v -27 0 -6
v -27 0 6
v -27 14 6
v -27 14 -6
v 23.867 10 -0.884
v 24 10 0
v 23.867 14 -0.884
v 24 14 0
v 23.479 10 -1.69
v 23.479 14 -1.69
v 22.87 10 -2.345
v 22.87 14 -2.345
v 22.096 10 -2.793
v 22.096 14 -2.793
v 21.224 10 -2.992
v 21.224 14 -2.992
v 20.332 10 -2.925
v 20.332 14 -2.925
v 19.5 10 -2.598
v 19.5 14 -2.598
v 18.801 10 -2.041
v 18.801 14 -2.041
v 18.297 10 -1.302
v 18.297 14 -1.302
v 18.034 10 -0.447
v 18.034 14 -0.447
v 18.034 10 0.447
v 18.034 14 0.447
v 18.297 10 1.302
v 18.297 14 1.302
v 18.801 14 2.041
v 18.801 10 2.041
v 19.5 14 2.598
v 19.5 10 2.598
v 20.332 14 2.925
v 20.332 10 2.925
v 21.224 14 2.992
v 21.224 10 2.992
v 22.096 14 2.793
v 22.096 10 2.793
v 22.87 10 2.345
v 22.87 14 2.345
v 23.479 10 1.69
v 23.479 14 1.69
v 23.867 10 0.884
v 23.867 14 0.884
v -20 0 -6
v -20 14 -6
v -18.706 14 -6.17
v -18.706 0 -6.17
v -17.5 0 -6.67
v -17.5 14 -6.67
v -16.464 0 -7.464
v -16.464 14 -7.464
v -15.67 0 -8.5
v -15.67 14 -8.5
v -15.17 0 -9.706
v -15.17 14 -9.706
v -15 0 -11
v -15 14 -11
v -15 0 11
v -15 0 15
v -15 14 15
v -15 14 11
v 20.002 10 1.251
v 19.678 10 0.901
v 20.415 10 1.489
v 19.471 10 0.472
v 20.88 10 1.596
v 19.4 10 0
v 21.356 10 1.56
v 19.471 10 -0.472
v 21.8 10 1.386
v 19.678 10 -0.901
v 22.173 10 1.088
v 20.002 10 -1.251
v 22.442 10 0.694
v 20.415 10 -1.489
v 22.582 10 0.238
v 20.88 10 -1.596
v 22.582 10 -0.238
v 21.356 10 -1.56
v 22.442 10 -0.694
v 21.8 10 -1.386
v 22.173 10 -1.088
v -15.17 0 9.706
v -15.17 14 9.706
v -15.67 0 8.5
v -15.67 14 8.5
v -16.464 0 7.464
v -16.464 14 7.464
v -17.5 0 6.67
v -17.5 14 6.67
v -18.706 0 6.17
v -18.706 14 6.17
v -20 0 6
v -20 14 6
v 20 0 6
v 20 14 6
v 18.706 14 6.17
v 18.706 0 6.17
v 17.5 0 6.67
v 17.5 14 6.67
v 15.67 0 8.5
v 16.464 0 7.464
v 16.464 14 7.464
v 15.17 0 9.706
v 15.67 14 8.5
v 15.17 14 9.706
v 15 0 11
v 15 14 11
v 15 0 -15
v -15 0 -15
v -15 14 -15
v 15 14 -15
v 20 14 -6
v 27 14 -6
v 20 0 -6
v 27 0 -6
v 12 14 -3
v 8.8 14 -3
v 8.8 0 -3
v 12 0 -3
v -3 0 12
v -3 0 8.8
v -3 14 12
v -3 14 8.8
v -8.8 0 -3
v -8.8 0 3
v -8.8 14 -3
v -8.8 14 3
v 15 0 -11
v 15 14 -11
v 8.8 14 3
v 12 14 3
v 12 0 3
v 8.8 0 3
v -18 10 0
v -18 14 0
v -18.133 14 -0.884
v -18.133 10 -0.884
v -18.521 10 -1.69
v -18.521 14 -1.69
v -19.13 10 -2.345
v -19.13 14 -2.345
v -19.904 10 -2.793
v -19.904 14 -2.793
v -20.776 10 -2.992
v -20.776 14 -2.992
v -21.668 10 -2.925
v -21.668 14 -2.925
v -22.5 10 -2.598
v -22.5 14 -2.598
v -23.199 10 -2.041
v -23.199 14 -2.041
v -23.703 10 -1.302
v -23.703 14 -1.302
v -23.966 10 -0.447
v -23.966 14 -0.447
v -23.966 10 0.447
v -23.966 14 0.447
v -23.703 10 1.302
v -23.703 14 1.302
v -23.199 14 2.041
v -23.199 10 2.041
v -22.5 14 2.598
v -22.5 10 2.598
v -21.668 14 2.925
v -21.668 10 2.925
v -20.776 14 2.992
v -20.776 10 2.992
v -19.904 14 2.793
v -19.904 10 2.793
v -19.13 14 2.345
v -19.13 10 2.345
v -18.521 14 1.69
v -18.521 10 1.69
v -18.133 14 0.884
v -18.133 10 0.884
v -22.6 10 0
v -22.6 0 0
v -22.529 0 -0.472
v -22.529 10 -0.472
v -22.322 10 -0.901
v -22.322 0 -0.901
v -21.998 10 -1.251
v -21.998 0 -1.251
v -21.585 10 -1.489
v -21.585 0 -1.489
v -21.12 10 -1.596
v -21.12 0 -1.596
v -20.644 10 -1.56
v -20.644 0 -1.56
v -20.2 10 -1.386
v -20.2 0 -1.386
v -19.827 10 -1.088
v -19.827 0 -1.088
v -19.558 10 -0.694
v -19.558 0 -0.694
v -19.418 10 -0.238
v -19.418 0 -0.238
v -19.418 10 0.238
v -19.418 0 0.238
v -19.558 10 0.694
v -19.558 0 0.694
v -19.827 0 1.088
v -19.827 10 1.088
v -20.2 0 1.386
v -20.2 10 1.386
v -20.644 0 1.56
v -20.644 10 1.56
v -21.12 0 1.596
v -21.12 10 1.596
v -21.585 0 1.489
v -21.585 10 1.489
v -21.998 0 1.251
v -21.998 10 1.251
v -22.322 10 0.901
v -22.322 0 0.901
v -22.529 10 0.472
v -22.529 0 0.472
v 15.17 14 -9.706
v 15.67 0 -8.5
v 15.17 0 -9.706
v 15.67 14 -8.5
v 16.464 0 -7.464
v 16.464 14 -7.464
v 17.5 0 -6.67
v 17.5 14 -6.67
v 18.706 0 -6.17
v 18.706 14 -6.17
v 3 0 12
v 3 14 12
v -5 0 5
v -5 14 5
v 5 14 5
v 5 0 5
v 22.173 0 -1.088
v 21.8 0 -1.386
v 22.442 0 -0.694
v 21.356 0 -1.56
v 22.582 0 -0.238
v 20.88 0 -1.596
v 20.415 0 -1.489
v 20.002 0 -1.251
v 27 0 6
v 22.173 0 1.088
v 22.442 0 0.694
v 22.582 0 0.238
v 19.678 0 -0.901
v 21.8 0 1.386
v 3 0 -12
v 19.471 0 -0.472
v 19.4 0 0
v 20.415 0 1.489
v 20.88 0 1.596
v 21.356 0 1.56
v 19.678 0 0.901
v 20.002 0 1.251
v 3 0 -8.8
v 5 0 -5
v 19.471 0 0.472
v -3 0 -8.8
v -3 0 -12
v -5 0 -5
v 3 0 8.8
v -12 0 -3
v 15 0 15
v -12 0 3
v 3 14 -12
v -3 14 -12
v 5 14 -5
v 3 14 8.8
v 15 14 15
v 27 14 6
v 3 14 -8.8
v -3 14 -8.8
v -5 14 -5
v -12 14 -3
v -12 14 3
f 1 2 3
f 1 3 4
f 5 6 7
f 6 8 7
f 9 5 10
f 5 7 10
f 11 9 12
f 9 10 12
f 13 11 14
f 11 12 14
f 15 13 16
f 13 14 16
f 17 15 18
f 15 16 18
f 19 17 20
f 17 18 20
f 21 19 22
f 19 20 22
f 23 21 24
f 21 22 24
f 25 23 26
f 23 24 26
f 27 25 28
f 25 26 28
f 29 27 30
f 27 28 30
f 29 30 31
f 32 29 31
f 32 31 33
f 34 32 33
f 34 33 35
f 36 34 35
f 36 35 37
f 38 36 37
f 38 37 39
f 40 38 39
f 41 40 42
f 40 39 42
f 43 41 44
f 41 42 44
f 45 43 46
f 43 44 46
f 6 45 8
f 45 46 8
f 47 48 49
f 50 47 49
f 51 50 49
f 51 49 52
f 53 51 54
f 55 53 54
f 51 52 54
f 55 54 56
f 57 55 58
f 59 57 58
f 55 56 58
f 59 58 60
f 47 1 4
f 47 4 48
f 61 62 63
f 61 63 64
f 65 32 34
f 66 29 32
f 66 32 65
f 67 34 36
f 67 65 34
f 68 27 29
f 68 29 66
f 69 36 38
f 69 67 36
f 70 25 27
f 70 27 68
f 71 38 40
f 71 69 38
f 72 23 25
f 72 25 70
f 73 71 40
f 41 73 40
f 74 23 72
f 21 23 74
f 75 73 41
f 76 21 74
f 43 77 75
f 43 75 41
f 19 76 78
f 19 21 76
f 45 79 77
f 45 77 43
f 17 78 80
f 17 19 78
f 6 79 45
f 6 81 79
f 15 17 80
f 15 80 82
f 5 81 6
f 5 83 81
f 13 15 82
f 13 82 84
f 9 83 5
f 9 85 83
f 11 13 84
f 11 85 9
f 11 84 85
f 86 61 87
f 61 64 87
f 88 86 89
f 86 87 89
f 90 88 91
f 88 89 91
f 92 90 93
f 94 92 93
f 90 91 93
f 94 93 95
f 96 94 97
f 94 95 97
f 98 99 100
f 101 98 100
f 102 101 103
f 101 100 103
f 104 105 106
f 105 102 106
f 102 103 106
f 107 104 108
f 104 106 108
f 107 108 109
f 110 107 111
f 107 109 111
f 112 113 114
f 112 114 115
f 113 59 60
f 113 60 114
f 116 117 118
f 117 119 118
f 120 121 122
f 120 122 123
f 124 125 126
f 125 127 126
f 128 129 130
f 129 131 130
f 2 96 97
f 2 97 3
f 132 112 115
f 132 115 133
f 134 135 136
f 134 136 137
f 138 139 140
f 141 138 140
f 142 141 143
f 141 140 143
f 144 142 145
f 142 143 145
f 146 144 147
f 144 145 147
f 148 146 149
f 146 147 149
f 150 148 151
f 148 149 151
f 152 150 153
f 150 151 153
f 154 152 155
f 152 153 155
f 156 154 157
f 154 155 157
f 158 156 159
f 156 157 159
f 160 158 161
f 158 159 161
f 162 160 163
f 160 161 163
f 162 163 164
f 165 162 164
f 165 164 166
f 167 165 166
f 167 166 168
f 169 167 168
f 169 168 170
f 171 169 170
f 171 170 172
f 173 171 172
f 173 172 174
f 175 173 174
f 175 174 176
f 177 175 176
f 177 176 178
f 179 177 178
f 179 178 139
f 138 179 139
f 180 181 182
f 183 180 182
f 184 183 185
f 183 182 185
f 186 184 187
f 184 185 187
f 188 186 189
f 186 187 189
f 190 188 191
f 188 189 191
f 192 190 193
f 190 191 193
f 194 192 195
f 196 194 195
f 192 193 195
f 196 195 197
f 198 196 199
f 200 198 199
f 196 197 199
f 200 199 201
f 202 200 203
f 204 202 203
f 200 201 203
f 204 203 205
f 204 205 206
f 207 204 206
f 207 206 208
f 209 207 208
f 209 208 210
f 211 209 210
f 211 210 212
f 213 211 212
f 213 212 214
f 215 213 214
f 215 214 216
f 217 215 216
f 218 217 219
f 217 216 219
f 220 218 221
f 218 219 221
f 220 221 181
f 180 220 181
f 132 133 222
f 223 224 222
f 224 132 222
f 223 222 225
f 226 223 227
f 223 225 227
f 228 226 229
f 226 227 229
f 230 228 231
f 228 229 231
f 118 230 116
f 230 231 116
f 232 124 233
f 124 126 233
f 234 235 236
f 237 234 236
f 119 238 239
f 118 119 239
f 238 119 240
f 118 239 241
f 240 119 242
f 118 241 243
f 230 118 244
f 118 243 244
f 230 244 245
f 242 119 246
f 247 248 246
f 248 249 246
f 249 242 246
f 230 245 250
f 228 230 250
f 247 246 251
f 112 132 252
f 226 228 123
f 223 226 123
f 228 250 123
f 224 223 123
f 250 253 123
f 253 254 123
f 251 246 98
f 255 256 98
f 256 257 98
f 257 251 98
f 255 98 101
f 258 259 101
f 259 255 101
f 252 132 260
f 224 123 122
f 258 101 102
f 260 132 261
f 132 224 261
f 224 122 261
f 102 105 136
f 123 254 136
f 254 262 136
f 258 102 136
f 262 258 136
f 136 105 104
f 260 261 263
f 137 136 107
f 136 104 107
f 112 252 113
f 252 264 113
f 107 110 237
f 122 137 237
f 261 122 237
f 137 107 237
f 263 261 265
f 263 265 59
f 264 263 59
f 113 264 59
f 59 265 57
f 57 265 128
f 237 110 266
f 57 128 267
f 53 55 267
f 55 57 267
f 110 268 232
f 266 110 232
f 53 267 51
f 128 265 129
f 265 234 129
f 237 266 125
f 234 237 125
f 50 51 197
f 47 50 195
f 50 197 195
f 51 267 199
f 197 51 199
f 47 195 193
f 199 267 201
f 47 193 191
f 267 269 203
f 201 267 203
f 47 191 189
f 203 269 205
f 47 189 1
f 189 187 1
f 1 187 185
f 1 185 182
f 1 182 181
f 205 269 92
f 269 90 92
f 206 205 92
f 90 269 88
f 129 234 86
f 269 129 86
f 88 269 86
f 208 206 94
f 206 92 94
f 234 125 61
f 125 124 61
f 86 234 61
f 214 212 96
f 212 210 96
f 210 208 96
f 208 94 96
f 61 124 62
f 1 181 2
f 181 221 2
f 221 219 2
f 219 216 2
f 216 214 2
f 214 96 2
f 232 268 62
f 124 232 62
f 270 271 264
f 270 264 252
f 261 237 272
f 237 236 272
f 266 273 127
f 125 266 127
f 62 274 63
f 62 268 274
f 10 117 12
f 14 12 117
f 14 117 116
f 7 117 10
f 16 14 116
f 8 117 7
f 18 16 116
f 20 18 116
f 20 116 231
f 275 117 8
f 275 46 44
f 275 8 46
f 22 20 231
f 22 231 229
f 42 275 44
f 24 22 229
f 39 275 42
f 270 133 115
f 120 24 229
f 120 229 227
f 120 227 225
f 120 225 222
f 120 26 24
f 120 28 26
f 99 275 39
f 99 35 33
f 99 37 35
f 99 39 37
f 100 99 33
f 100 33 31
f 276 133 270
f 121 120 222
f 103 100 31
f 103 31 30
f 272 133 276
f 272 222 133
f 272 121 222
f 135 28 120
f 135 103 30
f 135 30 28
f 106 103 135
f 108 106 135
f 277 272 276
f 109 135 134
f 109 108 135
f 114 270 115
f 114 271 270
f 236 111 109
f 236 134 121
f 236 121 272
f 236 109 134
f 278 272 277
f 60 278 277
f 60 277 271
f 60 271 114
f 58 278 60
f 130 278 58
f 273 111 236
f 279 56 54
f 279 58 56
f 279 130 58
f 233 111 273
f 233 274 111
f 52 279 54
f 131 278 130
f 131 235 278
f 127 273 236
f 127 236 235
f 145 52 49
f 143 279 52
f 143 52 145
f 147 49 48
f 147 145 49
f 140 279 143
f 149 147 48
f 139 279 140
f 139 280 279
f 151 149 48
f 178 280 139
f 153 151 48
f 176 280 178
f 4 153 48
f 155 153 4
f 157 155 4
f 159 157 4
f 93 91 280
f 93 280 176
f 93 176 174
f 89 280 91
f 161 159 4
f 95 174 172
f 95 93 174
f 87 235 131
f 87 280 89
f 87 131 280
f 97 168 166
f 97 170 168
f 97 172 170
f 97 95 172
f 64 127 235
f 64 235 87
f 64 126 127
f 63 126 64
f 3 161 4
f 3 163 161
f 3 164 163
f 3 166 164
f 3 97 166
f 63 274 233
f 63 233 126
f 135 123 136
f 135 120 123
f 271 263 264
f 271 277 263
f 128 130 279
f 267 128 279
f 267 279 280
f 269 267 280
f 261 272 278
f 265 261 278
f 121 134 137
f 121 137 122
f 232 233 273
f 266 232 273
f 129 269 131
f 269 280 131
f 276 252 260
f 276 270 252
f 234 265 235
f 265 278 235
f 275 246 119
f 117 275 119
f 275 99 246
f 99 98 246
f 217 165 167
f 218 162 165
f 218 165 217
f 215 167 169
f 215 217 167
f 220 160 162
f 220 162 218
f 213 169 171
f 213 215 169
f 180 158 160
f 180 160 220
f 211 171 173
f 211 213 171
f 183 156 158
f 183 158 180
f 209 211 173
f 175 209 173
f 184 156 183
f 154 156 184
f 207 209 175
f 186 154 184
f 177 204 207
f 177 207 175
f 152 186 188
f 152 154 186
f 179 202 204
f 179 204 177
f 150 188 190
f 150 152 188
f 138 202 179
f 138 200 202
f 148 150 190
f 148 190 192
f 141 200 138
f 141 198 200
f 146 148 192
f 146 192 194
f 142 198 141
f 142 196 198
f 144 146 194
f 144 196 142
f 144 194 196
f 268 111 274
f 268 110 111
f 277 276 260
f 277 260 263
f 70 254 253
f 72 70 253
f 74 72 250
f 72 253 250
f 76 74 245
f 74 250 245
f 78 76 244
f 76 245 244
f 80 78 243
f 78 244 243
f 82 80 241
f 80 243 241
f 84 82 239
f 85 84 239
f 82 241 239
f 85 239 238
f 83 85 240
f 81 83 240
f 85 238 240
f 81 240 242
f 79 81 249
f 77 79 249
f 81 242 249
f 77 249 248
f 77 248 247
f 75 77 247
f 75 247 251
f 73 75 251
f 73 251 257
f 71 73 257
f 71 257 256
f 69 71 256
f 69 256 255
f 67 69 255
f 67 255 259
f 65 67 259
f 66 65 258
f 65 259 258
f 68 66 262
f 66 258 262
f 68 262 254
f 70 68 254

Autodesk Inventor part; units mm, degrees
ref_plane "YZ Plane" through (0, 0, 0) normal (1, 0, 0) x (0, 1, 0)
ref_plane "XZ Plane" through (0, 0, 0) normal (0, 1, 0) x (-1, 0, 0)
ref_plane "XY Plane" through (0, 0, 0) normal (0, 0, 1) x (1, 0, 0)
sketch "Sketch2" plane through (0, 0, 0) normal (0, 1, 0) x (-1, 0, 0)
  line L0 (-15, 15) -> (15, 15)
  line L1 (15, 15) -> (15, -15)
  line L2 (15, -15) -> (-15, -15)
  line L3 (-15, -15) -> (-15, 15)
  line L4 (-15, 15) -> (15, -15) construction
  line L5 (15, 15) -> (-15, -15) construction
  line L6 (15, 6) -> (27, 6)
  line L7 (27, 6) -> (27, -6)
  line L8 (27, -6) -> (15, -6)
  line L9 (15, -6) -> (15, 6)
  line L10 (0, 15) -> (0, -15)
  line L11 (-15, 6) -> (-27, 6)
  line L12 (-27, 6) -> (-27, -6)
  line L13 (-27, -6) -> (-15, -6)
  line L14 (-15, -6) -> (-15, 6)
  circle A0 centre (21, 0) radius 1.6
  circle A1 centre (-21, 0) radius 1.6
  point P0 (0, 0)
  point P1 (15, 0)
  point P2 (-15, 0)
  point P3 (21, 6)
  point P4 (0, 0)
  dimension "d2" = 30
  dimension "d16" = 12
  dimension "d17" = 3.2
extrude "Extrusion1" add sketch "Sketch2" along normal blind 14
sketch "Sketch3" plane through (0, 14, 0) normal (0, 1, 0) x (1, 0, 0)
  line L0 (-3, -12) -> (3, -12)
  line L1 (3, -12) -> (3, -8.8)
  line L2 (3, -8.8) -> (-3, -8.8)
  line L3 (-3, -8.8) -> (-3, -12)
  line L4 (-3, -12) -> (3, -8.8) construction
  line L5 (3, -12) -> (-3, -8.8) construction
  line L6 (-15, 15) -> (-15, -15) projected
  line L7 (-15, 0) -> (15, 0)
  line L8 (15, -15) -> (15, 15) projected
  line L9 (-12, -3) -> (-8.8, -3)
  line L10 (-8.8, -3) -> (-8.8, 3)
  line L11 (-8.8, 3) -> (-12, 3)
  line L12 (-12, 3) -> (-12, -3)
  line L13 (-12, -3) -> (-8.8, 3) construction
  line L14 (-8.8, -3) -> (-12, 3) construction
  line L15 (-15, -15) -> (15, -15) projected
  line L16 (0, -15) -> (0, 15)
  line L17 (15, 15) -> (-15, 15) projected
  line L18 (-3, 12) -> (3, 12)
  line L19 (3, 12) -> (3, 8.8)
  line L20 (3, 8.8) -> (-3, 8.8)
  line L21 (-3, 8.8) -> (-3, 12)
  line L22 (12, -3) -> (8.8, -3)
  line L23 (8.8, -3) -> (8.8, 3)
  line L24 (8.8, 3) -> (12, 3)
  line L25 (12, 3) -> (12, -3)
  line L26 (12, -3) -> (8.8, 3) construction
  line L27 (8.8, -3) -> (12, 3) construction
  point P0 (0, 0)
  point P1 (0, -10.4)
  point P2 (-10.4, 0)
  point P3 (0, 0)
  point P4 (10.4, 0)
  dimension "d10" = 3
  dimension "d11" = 3
  dimension "d12" = 6
  dimension "d13" = 3.2
extrude "Extrusion2" cut sketch "Sketch3" against normal through all contours L3 L2 L16 L0 | L16 L2 L1 L0 | L10 L9 L12 L7 | L7 L12 L11 L10 | L23 L24 L25 L7 | L7 L25 L22 L23 | L20 L21 L18 L16 | L16 L18 L19 L20
sketch "Sketch4" plane through (0, 14, 0) normal (0, 1, 0) x (1, 0, 0)
  circle A0 centre (-21, 0) radius 3
  circle A1 centre (-21, 0) radius 1.6 projected
  line L0 (-15, -15) -> (15, -15) projected
  line L1 (0, -15) -> (0, 15)
  line L2 (15, 15) -> (-15, 15) projected
  circle A2 centre (21, 0) radius 3
  point P0 (0, 0)
  dimension "d18" = 6
extrude "Extrusion3" cut sketch "Sketch4" against normal blind 4 contours A0 | A1 | A2
fillet "Fillet1" radius 5 4 edges at (15, 7, -6) (15, 7, 6) (-15, 7, 6) (-15, 7, -6)
sketch "Sketch5" plane through (0, 14, 0) normal (0, 1, 0) x (1, 0, 0)
  line L0 (5, 5) -> (-5, 5)
  line L1 (-5, 5) -> (-5, -5)
  line L2 (-5, -5) -> (5, -5)
  line L3 (5, -5) -> (5, 5)
  line L4 (5, 5) -> (-5, -5) construction
  line L5 (-5, 5) -> (5, -5) construction
  point P0 (0, 0)
  dimension "d22" = 10
extrude "Extrusion4" cut sketch "Sketch5" against normal through all
equation "\"d11\" = d10"
properties part number "Lower Path Fixation"
